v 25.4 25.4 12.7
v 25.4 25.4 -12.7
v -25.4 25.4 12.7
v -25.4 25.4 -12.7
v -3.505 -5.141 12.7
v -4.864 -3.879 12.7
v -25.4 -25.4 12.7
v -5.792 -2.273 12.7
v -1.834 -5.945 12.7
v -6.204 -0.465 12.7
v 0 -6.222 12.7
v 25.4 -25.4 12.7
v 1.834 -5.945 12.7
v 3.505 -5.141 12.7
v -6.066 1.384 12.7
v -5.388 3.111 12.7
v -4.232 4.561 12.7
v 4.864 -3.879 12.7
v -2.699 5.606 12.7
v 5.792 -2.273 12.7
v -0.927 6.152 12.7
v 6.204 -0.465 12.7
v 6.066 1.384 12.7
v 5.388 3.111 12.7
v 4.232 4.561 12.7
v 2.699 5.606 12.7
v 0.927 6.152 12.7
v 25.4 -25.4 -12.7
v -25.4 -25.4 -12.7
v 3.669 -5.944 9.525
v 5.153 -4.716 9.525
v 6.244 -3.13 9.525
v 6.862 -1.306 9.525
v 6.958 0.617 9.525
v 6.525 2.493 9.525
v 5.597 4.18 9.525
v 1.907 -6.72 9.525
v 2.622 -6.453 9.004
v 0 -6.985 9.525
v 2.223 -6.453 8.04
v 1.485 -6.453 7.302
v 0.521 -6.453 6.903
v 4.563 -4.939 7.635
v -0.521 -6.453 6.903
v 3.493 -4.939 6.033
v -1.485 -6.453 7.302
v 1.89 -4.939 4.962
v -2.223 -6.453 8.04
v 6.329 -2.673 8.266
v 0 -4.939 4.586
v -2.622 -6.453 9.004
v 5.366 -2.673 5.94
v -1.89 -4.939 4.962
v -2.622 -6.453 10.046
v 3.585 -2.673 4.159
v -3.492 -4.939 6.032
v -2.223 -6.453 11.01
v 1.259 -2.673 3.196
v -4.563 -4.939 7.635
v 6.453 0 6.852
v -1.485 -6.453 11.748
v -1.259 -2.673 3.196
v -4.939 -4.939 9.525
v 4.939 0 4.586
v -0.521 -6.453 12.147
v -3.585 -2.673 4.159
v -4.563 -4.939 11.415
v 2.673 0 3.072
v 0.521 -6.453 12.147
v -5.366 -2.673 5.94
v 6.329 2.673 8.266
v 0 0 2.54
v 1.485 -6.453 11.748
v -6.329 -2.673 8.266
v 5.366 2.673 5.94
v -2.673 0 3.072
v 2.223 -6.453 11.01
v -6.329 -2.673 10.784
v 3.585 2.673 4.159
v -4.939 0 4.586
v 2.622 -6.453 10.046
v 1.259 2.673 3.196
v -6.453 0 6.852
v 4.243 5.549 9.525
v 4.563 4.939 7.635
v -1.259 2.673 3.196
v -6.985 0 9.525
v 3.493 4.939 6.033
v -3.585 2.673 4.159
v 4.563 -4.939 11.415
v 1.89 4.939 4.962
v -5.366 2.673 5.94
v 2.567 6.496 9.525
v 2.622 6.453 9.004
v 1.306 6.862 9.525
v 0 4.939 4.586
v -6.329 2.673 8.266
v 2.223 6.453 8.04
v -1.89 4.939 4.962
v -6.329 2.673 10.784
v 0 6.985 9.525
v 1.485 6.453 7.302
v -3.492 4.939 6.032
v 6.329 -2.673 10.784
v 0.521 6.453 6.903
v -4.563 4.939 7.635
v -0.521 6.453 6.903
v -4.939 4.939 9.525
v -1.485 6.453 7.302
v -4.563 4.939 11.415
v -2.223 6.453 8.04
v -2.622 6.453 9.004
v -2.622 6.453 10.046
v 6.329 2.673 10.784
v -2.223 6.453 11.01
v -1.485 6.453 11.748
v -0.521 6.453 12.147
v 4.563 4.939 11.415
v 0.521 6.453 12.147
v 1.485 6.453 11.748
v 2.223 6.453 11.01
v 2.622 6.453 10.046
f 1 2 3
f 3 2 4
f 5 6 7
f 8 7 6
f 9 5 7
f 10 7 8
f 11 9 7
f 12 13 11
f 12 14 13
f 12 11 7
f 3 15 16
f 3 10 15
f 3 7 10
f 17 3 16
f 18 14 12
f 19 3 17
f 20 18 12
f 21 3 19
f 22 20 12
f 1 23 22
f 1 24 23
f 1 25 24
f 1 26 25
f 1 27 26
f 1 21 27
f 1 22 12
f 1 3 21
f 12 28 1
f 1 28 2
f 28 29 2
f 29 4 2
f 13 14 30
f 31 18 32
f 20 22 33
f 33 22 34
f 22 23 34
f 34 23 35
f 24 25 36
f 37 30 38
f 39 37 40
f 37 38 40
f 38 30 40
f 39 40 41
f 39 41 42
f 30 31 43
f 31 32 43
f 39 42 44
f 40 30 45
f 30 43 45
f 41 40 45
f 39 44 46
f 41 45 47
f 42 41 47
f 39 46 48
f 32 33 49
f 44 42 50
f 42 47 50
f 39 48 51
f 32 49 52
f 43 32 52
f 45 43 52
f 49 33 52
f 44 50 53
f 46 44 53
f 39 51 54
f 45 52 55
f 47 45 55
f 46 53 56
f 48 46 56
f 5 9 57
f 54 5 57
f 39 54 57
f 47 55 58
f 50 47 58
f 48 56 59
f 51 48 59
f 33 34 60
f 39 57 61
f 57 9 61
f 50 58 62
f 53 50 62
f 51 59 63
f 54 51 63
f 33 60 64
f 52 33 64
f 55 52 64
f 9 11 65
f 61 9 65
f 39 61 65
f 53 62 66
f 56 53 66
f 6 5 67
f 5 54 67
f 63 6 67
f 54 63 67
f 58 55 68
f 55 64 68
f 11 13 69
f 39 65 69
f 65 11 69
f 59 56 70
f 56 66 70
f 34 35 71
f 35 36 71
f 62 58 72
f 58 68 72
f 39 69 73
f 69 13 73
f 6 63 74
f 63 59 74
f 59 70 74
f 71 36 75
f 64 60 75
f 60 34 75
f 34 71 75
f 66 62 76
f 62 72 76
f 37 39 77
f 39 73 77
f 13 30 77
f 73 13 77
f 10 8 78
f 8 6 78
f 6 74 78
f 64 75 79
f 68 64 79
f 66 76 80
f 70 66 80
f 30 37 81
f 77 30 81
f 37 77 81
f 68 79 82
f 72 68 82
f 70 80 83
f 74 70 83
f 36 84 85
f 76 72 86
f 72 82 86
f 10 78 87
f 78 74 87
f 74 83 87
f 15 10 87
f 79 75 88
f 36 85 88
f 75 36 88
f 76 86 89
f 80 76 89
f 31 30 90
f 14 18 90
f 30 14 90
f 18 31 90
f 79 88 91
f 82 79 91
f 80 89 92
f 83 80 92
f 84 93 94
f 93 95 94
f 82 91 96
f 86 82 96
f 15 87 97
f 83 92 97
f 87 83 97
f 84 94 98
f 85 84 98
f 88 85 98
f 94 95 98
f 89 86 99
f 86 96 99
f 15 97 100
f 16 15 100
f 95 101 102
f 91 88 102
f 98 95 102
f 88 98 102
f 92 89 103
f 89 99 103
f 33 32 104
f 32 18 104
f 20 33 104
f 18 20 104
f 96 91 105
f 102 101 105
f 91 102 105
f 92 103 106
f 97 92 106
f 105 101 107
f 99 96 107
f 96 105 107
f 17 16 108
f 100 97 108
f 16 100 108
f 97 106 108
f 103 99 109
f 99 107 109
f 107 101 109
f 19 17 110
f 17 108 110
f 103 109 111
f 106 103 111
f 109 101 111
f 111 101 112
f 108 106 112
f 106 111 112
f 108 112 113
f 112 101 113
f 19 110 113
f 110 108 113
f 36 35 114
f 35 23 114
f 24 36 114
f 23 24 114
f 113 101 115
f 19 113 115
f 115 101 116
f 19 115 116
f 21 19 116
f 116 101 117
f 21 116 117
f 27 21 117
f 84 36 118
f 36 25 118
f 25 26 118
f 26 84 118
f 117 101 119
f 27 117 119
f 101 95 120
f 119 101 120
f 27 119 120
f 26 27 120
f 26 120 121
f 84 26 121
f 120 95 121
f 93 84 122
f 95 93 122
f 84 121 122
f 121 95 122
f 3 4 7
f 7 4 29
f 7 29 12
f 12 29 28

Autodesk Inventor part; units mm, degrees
ref_plane "YZ Plane" through (0, 0, 0) normal (1, 0, 0) x (0, 1, 0)
ref_plane "XZ Plane" through (0, 0, 0) normal (0, 1, 0) x (-1, 0, 0)
ref_plane "XY Plane" through (0, 0, 0) normal (0, 0, 1) x (1, 0, 0)
sketch "Sketch1" plane through (0, 0, 0) normal (0, 0, 1) x (1, 0, 0)
  line L0 (-25.4, -25.4) -> (25.4, -25.4)
  line L1 (25.4, -25.4) -> (25.4, 25.4)
  line L2 (25.4, 25.4) -> (-25.4, 25.4)
  line L3 (-25.4, 25.4) -> (-25.4, -25.4)
  line L4 (-25.4, -25.4) -> (25.4, 25.4) construction
  line L5 (25.4, -25.4) -> (-25.4, 25.4) construction
  point P0 (0, 0)
  dimension "d0" = 50.8
extrude "Extrusion1" add sketch "Sketch1" along normal mid plane 25.4
ref_plane "Work Plane1" through (0, 0, 9.525) normal (0, 0, 1) x (1, 0, 0)
sketch "Sketch2" plane through (0, 0, 9.525) normal (0, 0, 1) x (1, 0, 0)
  arc A0 (0, -6.985) -> (0, 6.985) centre (0, 0) ccw
  line L0 (0, -6.985) -> (0, 6.985)
  dimension "d5" = 6.985
revolve "Revolution1" cut sketch "Sketch2" angle 360 about axis through (0, -6.985, 9.525) along (0, 1, 0)
equation "\"d0\" = sideLength"
equation "\"d1\" = partDepth"
equation "\"d5\" = radiusofBallHole"
equation "\"d3\" = -workPlaneForBallDistanceFfromFontEdge"
equation "\"radiusofBallHole\" = 0.5 * diameterOfBallHole"
equation "\"sideLength\" = 50.8"
equation "\"partDepth\" = 25.4"
equation "\"workPlaneForBallDistanceFfromFontEdge\" = 3.175"
equation "\"allowancForBallToRotate\" = 1.27"
equation "\"diameterOfBallHole\" = 13.97"
properties part number "socket"
